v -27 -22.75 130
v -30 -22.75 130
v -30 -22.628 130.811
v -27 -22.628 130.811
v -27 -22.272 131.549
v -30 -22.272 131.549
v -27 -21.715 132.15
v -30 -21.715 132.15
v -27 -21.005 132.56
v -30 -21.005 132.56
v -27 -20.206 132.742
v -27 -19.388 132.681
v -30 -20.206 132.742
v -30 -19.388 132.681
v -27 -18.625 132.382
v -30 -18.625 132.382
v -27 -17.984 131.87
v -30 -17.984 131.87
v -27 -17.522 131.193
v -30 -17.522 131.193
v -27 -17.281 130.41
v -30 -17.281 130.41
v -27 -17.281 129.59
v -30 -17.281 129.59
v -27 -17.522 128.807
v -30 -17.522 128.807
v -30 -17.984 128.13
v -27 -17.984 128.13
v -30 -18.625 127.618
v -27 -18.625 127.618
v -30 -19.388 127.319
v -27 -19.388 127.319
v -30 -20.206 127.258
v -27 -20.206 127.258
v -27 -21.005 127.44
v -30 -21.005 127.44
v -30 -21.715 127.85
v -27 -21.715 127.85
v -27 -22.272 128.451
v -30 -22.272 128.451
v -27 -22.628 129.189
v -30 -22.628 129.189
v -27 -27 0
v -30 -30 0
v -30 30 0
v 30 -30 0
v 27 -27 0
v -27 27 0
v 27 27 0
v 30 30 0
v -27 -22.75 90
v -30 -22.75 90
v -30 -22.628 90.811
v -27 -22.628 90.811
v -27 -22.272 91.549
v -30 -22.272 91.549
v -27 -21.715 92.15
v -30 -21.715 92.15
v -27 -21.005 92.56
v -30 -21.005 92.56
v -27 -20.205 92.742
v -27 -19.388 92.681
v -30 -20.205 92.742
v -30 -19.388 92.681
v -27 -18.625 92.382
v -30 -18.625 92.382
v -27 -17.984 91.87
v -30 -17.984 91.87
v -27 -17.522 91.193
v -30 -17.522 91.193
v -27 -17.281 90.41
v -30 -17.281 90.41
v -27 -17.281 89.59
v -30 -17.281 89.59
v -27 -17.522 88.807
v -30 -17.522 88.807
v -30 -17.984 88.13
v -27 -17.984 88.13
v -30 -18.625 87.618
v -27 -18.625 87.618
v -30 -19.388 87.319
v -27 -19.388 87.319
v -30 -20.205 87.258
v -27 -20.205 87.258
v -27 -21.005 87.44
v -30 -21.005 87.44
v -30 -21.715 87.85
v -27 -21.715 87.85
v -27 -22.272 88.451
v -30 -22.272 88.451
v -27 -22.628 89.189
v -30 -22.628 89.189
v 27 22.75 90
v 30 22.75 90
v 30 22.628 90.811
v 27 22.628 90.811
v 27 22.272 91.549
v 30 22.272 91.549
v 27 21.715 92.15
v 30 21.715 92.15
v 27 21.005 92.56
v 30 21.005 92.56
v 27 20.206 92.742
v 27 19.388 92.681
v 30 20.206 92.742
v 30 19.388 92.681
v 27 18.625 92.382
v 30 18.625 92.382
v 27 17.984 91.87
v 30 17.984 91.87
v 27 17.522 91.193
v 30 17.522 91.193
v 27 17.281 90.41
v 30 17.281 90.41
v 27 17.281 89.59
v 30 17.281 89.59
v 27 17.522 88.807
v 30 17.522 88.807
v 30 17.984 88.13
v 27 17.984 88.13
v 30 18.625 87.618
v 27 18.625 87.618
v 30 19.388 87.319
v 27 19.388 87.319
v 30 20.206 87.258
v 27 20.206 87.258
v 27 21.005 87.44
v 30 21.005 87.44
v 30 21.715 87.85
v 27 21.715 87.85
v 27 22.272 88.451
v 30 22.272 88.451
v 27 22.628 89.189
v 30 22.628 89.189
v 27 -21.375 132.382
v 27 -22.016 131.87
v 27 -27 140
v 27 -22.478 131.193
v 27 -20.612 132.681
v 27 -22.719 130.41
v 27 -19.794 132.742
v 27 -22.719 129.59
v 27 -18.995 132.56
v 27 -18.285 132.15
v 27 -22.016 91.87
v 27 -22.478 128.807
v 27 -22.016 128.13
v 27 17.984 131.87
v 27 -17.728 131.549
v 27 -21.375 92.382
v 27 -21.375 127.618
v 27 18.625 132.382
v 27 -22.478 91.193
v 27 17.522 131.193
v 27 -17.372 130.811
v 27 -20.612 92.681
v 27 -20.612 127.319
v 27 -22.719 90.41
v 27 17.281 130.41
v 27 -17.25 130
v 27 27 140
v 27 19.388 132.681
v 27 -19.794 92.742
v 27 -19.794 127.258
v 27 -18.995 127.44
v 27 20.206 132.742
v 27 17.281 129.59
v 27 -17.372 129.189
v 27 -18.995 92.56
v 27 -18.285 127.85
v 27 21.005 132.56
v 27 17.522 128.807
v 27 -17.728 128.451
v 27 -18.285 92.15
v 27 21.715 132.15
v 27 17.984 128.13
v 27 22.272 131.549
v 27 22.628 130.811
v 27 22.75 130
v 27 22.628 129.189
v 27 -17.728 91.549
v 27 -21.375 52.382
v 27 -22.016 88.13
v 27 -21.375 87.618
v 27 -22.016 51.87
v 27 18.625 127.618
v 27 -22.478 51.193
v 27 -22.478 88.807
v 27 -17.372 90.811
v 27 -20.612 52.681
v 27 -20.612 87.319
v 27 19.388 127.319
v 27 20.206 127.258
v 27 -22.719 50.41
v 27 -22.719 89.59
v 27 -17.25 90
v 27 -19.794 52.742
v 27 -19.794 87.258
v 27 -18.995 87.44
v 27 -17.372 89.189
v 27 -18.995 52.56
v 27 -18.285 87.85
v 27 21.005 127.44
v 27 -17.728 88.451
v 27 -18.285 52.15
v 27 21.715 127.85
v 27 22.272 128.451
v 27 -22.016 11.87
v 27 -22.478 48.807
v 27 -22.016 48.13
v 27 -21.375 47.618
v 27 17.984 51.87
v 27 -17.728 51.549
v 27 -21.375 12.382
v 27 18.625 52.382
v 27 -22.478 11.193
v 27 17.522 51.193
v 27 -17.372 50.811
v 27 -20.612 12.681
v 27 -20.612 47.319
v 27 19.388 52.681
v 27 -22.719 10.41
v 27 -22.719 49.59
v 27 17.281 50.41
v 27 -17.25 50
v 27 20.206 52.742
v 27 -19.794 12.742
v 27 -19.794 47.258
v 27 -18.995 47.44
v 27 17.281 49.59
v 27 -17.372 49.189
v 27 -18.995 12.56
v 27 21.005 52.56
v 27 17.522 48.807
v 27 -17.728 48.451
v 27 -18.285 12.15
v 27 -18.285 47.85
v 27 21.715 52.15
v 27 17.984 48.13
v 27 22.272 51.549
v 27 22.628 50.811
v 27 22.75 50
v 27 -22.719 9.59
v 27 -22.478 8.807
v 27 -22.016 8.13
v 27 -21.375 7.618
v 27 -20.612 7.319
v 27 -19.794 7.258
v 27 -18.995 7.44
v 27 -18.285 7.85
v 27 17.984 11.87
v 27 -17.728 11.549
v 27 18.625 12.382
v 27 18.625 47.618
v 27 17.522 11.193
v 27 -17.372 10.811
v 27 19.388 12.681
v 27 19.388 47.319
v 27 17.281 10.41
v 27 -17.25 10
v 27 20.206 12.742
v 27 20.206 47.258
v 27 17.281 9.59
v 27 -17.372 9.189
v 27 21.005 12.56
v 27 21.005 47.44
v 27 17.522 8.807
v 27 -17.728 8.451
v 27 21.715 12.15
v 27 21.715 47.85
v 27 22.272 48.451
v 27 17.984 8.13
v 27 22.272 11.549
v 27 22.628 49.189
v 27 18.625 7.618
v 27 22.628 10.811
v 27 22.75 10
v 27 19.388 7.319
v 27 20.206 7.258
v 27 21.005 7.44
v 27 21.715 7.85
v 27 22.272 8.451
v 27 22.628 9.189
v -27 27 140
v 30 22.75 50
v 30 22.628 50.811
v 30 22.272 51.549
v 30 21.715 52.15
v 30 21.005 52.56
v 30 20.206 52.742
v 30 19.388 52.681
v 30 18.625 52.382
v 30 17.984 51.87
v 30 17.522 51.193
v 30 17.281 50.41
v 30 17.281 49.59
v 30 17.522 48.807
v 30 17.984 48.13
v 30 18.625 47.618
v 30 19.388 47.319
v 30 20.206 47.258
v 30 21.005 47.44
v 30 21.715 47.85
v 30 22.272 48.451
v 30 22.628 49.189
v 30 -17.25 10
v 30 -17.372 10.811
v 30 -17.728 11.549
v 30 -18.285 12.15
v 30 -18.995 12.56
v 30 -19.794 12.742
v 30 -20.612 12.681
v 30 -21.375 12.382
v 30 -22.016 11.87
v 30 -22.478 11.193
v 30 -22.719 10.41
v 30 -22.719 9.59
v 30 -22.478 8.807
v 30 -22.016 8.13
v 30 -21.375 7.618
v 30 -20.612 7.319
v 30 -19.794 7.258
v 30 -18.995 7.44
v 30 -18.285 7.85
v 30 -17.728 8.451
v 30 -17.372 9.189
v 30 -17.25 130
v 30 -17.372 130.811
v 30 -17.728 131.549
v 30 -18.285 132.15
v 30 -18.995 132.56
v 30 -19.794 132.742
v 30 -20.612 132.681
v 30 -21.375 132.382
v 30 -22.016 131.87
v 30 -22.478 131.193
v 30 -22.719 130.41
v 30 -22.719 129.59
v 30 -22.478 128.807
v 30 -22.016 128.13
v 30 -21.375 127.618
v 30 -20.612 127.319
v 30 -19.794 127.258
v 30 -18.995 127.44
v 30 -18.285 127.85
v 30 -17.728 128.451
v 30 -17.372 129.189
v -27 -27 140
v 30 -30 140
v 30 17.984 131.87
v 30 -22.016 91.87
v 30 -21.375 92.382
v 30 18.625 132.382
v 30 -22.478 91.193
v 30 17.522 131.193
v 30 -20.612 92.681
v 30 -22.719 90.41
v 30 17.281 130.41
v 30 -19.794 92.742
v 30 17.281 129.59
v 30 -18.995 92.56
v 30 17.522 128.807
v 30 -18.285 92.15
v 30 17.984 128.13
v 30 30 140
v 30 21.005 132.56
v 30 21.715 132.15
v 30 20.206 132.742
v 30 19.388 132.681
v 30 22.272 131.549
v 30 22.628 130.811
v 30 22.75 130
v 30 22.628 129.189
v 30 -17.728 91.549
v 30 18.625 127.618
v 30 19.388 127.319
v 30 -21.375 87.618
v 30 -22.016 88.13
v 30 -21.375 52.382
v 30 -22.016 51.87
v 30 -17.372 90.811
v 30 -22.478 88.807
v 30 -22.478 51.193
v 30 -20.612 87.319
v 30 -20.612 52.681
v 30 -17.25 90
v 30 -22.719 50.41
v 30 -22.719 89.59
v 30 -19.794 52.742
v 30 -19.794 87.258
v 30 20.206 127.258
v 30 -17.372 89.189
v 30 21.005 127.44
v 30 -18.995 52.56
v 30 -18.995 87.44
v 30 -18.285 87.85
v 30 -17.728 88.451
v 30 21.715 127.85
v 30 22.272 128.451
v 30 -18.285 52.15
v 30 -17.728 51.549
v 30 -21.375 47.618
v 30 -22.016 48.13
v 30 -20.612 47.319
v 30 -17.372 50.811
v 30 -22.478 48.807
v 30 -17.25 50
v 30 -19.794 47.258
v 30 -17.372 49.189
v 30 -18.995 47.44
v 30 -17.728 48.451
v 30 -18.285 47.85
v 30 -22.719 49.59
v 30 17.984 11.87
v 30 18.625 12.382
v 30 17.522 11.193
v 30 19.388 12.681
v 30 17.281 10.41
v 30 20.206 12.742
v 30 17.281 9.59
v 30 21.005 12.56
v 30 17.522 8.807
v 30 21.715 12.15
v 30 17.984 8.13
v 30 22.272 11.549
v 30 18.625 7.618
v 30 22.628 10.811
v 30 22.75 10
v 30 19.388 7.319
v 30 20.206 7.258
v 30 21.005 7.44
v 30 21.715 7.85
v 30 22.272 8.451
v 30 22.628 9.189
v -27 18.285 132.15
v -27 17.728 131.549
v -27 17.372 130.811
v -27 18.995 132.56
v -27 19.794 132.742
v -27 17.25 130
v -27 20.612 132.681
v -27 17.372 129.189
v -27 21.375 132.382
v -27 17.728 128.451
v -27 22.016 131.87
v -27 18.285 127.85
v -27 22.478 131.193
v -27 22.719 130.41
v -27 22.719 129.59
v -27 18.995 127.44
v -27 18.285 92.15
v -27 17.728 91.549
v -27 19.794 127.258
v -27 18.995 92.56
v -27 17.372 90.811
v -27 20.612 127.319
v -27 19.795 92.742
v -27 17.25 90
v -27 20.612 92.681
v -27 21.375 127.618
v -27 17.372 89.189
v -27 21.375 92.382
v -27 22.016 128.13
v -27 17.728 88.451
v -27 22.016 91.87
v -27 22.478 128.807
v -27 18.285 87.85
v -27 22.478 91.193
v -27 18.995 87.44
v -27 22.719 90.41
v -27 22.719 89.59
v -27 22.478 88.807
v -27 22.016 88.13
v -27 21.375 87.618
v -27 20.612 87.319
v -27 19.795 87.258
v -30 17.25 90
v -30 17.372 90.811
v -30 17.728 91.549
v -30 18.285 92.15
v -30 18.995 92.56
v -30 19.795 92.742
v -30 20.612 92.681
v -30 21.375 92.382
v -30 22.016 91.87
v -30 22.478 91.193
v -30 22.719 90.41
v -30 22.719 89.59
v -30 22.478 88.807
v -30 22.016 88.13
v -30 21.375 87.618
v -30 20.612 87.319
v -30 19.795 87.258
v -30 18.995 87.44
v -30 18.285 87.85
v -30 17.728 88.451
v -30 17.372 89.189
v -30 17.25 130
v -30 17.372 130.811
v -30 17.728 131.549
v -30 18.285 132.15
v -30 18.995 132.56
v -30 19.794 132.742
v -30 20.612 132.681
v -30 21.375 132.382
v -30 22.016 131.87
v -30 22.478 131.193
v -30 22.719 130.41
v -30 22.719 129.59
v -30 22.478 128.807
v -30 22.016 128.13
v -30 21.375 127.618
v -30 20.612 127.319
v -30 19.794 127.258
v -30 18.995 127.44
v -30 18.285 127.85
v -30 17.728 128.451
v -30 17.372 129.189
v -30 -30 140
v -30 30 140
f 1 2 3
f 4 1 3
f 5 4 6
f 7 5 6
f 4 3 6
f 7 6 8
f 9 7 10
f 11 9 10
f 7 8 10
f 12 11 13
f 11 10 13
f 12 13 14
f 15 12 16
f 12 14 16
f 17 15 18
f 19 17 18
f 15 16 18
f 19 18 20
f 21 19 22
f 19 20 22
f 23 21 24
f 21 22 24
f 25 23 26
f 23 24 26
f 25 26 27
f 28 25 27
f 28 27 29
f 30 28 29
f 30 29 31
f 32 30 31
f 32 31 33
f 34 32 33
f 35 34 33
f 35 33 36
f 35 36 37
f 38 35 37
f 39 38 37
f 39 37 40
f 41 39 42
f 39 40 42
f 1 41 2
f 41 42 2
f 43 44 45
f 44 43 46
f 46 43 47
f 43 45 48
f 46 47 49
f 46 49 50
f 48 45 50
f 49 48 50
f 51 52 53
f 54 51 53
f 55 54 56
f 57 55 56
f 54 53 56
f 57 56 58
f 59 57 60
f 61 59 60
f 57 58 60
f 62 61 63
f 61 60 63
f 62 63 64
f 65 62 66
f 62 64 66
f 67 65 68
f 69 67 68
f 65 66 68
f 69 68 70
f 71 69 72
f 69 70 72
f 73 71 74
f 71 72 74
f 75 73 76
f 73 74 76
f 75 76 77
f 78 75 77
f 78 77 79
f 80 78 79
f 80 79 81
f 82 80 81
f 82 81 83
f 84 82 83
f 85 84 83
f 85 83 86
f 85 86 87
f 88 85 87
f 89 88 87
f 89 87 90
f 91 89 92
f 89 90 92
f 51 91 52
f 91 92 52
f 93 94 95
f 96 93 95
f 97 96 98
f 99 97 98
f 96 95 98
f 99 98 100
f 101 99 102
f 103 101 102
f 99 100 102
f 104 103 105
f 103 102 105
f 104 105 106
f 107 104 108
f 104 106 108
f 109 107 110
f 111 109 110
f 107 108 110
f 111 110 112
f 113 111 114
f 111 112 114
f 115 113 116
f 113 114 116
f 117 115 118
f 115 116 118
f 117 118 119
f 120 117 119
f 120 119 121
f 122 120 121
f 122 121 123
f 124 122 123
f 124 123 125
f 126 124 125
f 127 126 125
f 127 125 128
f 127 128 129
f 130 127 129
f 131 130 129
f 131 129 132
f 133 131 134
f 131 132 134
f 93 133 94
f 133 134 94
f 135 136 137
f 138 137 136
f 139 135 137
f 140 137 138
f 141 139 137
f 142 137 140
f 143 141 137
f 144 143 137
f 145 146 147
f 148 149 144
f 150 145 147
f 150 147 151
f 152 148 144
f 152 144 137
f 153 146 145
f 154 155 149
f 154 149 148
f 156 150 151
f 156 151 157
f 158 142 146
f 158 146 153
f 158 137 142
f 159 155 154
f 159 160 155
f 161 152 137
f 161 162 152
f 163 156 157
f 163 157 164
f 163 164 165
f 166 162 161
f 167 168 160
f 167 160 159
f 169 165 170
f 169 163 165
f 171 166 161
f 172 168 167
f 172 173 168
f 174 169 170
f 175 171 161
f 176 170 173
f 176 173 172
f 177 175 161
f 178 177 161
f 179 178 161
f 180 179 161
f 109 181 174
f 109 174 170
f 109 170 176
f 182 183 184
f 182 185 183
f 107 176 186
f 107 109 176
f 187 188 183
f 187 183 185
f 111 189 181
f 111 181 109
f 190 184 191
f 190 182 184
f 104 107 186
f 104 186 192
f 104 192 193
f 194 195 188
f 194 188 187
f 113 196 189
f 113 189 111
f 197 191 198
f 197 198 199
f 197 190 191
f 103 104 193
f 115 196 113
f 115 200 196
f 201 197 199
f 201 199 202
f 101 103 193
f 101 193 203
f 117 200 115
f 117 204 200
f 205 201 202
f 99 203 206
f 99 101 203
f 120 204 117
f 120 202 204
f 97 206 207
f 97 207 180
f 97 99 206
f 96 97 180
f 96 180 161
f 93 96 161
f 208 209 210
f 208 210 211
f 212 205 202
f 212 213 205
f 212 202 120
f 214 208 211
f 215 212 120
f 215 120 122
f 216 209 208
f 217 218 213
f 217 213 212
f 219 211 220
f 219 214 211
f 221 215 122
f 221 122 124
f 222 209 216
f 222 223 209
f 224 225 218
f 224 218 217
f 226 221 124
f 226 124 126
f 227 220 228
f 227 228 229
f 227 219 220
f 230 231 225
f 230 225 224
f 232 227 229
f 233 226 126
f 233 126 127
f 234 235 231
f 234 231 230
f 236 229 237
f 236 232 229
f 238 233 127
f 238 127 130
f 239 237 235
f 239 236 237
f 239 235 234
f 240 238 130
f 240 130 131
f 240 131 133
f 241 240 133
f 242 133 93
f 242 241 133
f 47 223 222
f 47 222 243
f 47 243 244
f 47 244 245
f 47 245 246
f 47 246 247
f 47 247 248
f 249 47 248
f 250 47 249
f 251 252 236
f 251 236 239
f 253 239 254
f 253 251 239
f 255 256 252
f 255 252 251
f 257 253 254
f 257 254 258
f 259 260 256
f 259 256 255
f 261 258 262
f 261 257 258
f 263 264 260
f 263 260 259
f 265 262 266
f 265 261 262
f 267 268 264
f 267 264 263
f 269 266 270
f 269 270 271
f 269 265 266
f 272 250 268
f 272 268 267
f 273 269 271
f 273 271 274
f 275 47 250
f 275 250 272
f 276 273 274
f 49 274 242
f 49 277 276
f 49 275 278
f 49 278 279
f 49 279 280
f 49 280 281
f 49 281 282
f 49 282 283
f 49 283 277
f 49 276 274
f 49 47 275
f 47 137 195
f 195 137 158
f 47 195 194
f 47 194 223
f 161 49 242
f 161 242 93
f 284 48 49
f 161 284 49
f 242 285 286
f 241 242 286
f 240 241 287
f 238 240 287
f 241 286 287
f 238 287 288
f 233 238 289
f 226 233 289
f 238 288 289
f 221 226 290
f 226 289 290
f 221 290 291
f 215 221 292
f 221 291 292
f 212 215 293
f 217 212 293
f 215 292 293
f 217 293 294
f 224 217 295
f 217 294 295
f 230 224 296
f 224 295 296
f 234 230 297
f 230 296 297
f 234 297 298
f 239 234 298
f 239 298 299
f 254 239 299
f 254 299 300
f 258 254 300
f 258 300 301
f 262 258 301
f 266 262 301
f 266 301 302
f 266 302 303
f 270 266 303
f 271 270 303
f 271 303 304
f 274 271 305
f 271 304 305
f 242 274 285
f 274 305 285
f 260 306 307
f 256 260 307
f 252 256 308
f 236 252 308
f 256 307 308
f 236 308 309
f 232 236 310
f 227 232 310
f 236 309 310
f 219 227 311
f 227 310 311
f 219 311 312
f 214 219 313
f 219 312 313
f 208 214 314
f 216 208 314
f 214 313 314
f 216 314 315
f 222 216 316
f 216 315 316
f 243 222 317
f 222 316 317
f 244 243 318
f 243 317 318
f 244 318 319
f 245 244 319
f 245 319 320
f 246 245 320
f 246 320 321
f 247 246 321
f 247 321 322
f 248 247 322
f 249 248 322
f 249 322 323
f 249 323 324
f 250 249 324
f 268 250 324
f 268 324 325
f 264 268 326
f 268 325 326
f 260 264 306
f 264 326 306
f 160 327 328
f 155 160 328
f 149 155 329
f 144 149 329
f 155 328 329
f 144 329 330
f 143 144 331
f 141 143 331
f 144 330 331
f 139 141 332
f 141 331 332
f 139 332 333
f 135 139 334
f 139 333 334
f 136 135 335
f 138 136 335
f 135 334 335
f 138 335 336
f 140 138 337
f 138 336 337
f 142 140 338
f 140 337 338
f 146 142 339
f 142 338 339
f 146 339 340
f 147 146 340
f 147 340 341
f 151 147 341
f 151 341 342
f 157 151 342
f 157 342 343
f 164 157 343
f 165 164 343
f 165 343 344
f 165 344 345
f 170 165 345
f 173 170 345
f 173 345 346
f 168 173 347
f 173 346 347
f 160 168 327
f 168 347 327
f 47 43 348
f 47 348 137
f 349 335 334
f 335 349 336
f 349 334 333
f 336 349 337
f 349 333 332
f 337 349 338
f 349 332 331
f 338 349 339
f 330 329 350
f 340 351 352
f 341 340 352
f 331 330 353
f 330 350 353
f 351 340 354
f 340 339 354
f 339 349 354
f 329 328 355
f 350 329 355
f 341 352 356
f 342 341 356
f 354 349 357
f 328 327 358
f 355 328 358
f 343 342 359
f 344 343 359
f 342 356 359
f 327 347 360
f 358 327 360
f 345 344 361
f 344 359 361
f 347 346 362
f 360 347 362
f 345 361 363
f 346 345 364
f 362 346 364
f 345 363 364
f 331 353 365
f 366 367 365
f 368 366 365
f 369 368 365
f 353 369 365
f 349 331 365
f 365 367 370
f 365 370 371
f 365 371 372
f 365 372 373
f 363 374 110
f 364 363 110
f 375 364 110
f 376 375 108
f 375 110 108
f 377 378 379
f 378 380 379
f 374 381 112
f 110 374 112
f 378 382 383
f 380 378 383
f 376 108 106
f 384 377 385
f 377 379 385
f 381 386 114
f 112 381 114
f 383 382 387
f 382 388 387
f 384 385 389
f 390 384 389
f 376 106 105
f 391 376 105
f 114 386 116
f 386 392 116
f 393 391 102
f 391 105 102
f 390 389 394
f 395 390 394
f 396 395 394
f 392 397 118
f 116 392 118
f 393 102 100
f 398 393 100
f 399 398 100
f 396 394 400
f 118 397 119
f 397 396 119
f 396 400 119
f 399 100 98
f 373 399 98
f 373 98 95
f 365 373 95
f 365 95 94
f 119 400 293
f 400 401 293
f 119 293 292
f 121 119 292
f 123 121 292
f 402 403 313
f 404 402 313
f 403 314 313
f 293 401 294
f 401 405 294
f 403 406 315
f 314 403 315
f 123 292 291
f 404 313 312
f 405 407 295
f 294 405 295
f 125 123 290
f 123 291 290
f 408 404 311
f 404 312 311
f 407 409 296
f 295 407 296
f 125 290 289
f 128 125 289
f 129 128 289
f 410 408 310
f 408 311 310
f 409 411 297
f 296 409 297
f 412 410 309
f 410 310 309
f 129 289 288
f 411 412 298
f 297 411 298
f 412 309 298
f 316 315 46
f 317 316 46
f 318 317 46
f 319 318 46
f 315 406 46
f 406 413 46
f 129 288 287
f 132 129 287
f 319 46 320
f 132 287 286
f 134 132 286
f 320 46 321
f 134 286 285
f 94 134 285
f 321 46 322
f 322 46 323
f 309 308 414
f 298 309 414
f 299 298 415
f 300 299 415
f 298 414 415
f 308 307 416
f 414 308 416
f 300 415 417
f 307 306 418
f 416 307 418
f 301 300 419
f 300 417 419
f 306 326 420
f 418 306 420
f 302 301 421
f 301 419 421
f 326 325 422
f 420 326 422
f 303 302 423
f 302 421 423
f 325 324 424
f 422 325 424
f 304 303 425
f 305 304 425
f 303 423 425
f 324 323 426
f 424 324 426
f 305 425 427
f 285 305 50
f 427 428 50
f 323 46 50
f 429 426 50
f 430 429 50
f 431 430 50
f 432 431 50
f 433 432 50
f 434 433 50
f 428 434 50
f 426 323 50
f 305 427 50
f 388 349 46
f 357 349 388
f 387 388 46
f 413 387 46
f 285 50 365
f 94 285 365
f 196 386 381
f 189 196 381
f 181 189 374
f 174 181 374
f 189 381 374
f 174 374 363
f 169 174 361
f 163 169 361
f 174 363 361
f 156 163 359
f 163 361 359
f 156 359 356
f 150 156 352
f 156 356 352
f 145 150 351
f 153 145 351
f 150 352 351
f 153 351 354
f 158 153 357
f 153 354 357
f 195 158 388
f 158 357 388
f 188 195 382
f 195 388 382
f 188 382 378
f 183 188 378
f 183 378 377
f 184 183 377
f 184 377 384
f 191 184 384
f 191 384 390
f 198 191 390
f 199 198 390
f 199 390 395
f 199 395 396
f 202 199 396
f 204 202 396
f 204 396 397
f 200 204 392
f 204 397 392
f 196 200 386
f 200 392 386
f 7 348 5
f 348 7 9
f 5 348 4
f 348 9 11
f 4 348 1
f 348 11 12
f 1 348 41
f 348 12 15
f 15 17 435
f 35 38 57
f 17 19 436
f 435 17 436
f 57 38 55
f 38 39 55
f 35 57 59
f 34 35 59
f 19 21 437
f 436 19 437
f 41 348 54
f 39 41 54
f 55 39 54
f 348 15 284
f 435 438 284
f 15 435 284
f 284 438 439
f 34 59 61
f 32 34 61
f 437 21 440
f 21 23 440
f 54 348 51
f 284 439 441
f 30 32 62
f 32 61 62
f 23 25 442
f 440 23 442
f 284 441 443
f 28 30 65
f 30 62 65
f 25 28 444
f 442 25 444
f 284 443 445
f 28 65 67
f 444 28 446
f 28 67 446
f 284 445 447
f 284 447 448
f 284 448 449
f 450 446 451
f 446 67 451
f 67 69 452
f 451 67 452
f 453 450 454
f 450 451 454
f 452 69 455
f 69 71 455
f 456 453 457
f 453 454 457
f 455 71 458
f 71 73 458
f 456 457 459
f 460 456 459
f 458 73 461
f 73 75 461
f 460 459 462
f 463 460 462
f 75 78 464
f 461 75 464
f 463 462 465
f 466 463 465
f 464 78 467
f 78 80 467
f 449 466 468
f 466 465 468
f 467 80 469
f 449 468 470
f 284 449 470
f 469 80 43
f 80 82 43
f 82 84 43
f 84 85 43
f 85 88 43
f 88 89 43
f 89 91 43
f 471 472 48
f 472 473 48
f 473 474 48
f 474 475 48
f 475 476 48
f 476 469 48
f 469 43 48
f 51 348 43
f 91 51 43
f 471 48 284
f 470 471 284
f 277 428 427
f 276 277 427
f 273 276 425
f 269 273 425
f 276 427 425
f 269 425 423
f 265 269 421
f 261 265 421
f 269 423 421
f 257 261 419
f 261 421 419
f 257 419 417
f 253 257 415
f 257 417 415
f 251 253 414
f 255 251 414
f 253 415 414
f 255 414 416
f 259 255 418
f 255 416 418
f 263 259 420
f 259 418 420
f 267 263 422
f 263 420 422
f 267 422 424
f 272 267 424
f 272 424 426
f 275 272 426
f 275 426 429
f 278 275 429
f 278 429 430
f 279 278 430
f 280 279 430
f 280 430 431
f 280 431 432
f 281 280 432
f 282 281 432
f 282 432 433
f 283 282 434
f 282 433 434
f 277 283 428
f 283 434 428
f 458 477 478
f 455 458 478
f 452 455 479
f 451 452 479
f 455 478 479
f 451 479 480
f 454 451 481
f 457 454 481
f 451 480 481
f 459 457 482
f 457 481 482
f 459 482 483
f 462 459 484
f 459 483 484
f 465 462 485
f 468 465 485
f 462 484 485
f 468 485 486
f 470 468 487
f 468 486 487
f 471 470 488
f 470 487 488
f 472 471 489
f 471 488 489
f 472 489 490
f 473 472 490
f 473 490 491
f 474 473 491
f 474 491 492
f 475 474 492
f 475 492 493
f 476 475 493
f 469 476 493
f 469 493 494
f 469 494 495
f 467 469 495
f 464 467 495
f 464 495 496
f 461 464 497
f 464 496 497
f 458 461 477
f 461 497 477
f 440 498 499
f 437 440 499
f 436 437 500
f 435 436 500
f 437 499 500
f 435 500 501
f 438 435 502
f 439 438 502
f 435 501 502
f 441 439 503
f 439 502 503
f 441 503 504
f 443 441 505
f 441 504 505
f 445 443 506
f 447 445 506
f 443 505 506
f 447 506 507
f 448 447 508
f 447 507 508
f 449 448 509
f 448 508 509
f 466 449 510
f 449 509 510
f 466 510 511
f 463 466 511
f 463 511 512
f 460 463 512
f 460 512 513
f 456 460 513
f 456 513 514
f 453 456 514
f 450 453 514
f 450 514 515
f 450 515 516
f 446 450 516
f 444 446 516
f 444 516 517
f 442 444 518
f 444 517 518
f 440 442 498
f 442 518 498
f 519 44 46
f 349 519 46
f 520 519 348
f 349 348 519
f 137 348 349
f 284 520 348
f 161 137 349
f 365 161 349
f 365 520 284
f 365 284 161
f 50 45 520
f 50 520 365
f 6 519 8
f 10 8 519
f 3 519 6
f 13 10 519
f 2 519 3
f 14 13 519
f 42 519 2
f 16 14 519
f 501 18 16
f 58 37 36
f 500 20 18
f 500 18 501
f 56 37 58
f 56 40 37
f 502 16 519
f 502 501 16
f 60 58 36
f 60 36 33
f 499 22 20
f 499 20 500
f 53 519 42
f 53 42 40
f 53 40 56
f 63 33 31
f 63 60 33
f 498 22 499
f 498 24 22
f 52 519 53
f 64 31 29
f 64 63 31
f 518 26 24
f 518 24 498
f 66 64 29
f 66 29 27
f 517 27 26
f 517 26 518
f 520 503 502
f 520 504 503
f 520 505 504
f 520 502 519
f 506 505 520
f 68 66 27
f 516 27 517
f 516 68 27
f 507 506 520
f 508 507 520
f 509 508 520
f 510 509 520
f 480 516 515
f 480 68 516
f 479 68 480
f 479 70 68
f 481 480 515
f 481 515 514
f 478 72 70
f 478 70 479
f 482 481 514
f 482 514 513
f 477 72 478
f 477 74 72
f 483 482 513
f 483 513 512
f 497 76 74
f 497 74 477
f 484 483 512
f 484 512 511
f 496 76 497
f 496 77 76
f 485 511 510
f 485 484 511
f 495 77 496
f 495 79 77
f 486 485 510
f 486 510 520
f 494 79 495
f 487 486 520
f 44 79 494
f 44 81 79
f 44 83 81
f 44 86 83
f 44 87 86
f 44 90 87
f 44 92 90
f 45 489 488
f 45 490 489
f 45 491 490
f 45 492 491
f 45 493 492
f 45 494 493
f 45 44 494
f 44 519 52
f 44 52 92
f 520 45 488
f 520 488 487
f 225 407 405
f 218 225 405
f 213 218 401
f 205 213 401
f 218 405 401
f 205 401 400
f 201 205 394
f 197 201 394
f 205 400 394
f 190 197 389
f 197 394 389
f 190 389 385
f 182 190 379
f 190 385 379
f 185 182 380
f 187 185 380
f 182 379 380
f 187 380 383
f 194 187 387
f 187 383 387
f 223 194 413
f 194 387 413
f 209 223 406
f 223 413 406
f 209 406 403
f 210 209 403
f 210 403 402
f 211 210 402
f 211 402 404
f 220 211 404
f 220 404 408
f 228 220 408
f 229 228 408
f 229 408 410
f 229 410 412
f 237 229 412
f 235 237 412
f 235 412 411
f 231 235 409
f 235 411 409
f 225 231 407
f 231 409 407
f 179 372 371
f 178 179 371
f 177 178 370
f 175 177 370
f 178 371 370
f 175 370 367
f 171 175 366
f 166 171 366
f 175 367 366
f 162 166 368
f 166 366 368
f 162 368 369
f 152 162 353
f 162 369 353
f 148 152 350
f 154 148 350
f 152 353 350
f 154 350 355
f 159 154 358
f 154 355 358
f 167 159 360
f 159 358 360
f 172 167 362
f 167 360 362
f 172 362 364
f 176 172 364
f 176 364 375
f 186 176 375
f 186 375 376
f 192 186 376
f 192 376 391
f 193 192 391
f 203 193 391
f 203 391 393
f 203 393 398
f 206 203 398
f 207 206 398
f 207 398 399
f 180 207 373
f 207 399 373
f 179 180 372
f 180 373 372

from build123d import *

# Parameters (mm, degrees)
SKETCH_W        = 60
SKETCH_H        = 60
SKETCH_W_2      = 54
SKETCH_H_2      = 54
PAD_DEPTH       = 140
SKETCH001_R     = 2.75
POCKET_DEPTH    = 3
SKETCH002_R     = 2.75
POCKET001_DEPTH = 3


with BuildPart() as part:
    # Sketch → Pad (new body)
    with BuildSketch(Plane.XY):
        Rectangle(SKETCH_W, SKETCH_H)
        Rectangle(SKETCH_W_2, SKETCH_H_2, mode=Mode.SUBTRACT)
    extrude(amount=PAD_DEPTH)

    # Sketch001 (on Face2 of Pad) → Pocket (cut)
    with BuildSketch(Plane.YZ.offset(30)):
        with Locations((-20, 130)):
            Circle(SKETCH001_R)
        with Locations((20, 130)):
            Circle(SKETCH001_R)
        with Locations((-20, 90)):
            Circle(SKETCH001_R)
        with Locations((20, 90)):
            Circle(SKETCH001_R)
        with Locations((-20, 50)):
            Circle(SKETCH001_R)
        with Locations((20, 50)):
            Circle(SKETCH001_R)
        with Locations((-20, 10)):
            Circle(SKETCH001_R)
        with Locations((20, 10)):
            Circle(SKETCH001_R)
    extrude(amount=-POCKET_DEPTH, mode=Mode.SUBTRACT)

    # Sketch002 (on Face2 of Pocket) → Pocket001 (cut)
    with BuildSketch(Plane(origin=(-30, 0, 0), x_dir=(0, -1, 0), z_dir=(-1, 0, 0))):
        with Locations((-20, 130)):
            Circle(SKETCH002_R)
        with Locations((20, 129.999984)):
            Circle(SKETCH002_R)
        with Locations((-20.000016, 90)):
            Circle(SKETCH002_R)
        with Locations((19.999984, 89.999984)):
            Circle(SKETCH002_R)
    extrude(amount=-POCKET001_DEPTH, mode=Mode.SUBTRACT)


solid = part.part
